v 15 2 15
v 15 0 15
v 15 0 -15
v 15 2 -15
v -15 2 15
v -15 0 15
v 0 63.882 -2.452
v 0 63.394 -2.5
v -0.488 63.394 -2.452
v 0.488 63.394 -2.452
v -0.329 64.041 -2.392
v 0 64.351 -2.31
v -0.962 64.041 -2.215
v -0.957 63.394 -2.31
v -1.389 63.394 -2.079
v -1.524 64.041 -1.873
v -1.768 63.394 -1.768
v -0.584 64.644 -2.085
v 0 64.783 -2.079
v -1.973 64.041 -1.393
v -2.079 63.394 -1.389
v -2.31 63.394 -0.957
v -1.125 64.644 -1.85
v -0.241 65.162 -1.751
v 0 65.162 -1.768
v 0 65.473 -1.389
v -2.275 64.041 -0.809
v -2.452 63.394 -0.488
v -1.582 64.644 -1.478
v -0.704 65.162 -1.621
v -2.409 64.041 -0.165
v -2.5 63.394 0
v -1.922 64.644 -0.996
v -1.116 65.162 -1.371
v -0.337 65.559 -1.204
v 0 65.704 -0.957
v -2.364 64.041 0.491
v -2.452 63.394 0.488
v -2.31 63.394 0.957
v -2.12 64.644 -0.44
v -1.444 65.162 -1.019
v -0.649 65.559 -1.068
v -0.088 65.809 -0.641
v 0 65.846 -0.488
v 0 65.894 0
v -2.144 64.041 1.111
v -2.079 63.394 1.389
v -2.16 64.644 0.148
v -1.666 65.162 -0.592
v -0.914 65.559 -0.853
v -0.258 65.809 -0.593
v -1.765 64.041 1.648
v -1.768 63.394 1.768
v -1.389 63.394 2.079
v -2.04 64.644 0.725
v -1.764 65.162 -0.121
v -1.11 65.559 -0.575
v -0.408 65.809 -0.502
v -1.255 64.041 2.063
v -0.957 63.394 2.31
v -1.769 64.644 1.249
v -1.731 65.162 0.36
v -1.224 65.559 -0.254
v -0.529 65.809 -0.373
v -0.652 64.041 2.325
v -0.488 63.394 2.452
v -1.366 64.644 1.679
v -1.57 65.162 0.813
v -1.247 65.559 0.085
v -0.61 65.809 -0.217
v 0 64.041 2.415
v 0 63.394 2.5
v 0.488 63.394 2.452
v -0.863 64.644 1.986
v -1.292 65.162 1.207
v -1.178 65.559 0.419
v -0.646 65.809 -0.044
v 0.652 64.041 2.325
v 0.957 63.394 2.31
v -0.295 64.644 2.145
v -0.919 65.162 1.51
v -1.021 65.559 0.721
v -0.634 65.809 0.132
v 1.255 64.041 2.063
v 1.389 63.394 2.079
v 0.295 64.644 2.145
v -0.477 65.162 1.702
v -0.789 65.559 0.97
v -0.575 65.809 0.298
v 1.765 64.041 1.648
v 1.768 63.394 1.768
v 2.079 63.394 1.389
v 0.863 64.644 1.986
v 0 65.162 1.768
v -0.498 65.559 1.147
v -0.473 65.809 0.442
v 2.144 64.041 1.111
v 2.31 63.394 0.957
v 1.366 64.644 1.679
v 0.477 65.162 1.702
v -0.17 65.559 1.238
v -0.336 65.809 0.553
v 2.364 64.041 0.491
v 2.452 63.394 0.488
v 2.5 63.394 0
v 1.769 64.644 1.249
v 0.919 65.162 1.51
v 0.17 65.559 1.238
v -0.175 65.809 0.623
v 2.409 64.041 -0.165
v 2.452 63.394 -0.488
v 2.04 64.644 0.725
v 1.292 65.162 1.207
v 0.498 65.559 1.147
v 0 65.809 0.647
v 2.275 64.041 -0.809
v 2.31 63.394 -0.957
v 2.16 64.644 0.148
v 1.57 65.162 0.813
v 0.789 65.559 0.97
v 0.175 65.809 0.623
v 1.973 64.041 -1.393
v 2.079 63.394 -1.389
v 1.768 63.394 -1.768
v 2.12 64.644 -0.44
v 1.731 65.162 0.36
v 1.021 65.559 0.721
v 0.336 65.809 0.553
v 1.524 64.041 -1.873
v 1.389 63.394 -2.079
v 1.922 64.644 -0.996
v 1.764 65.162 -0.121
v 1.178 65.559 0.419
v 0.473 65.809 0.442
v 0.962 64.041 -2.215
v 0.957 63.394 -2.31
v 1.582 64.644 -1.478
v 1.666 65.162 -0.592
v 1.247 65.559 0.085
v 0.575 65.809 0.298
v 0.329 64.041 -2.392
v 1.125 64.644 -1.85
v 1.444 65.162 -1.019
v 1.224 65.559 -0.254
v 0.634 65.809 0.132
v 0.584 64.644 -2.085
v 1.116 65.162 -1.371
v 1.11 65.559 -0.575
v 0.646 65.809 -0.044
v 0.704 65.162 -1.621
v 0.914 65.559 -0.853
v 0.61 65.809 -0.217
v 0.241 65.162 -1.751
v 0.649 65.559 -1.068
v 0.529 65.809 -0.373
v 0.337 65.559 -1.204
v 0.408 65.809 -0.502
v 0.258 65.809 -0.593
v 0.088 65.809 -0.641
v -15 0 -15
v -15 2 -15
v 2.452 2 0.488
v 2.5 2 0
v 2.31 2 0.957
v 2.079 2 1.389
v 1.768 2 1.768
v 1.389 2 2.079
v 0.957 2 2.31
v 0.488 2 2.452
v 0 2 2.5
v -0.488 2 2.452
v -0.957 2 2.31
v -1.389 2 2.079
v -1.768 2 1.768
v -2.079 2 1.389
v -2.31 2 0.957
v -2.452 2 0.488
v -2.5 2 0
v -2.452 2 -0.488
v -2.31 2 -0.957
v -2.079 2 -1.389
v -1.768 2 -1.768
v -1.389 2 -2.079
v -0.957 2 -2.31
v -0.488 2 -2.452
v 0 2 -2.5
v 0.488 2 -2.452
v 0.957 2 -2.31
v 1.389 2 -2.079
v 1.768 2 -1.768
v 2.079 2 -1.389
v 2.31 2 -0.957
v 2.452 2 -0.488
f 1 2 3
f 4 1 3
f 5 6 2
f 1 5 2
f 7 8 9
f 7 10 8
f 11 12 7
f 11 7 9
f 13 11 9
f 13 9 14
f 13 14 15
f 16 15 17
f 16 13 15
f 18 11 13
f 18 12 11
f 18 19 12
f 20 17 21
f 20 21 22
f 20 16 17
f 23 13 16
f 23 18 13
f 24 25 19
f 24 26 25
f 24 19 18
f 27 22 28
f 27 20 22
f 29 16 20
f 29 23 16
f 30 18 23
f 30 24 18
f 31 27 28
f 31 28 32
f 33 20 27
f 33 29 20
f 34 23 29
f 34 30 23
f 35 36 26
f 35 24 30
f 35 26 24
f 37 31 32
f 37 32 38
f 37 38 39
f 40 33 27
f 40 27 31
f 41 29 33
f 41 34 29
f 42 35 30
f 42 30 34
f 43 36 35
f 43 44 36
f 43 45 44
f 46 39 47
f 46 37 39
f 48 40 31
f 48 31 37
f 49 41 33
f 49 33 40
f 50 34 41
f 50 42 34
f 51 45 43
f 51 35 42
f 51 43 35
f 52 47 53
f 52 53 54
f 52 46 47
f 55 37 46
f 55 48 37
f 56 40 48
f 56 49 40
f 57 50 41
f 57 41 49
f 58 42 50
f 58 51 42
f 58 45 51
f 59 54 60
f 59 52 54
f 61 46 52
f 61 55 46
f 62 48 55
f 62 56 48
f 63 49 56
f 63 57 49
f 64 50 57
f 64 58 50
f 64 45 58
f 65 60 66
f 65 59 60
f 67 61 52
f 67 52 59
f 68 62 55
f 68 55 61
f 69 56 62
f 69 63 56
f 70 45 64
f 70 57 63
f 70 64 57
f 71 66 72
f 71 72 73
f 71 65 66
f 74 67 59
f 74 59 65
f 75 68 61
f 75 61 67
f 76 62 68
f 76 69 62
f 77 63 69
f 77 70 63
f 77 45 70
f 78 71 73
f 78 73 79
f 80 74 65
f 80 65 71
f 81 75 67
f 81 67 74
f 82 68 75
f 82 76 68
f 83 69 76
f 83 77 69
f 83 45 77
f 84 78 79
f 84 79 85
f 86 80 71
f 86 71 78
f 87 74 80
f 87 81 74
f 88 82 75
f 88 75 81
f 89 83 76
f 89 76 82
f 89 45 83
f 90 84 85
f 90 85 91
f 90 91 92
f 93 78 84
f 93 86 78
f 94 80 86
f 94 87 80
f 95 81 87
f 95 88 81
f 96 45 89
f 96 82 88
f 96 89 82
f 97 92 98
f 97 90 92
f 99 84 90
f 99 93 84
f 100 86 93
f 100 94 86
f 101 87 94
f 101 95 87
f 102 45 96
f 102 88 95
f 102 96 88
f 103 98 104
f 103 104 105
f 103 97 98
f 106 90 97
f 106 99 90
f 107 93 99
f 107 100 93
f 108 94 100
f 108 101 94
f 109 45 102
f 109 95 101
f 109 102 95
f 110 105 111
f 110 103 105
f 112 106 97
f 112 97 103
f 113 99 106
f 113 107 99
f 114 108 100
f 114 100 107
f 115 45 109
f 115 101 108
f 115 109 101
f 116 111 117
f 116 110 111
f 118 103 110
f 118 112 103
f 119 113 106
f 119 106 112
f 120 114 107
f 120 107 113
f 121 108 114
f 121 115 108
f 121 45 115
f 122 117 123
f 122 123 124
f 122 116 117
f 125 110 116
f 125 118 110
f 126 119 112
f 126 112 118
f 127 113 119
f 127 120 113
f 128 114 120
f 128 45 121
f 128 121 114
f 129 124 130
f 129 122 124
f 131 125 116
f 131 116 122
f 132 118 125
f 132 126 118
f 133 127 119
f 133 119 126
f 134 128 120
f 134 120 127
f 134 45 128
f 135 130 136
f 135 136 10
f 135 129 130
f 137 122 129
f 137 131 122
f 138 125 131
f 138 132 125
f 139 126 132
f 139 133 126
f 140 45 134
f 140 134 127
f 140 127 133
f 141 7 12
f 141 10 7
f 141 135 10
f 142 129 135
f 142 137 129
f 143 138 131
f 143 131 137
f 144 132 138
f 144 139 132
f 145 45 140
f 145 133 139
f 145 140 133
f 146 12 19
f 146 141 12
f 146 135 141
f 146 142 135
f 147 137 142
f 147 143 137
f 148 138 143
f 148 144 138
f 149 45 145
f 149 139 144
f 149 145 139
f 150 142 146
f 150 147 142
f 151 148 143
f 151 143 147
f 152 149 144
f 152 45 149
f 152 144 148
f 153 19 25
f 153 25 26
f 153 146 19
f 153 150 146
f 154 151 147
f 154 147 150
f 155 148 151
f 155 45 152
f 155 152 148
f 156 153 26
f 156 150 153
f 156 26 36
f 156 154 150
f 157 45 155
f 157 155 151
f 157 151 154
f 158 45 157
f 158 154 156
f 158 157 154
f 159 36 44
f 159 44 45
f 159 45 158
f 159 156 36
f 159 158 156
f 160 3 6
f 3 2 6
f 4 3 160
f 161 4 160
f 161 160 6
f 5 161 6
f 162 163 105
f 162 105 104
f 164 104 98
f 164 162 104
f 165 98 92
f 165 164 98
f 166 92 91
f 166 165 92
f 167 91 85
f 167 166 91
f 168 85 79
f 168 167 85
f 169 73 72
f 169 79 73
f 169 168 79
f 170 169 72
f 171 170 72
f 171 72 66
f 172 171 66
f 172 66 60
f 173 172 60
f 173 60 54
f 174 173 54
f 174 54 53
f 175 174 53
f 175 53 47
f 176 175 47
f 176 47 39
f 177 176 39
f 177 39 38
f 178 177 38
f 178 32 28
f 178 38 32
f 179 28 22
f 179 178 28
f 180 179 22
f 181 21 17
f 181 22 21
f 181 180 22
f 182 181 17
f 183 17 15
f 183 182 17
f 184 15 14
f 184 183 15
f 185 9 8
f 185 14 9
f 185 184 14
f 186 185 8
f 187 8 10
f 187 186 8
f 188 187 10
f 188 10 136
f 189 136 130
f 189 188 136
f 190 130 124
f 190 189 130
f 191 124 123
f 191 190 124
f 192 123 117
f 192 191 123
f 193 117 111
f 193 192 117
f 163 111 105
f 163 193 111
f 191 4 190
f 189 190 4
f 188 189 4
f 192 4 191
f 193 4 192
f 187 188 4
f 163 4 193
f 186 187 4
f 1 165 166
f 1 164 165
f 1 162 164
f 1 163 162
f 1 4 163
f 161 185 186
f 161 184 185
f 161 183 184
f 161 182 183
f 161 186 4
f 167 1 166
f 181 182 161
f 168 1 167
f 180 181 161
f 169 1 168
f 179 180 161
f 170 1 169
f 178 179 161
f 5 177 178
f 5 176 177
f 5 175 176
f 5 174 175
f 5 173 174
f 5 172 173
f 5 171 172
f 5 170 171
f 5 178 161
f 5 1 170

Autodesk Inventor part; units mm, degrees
ref_plane "YZ Plane" through (0, 0, 0) normal (1, 0, 0) x (0, 1, 0)
ref_plane "XZ Plane" through (0, 0, 0) normal (0, 1, 0) x (-1, 0, 0)
ref_plane "XY Plane" through (0, 0, 0) normal (0, 0, 1) x (1, 0, 0)
sketch "Sketch1" plane through (0, 0, 0) normal (0, 1, 0) x (-1, 0, 0)
  line L0 (15, 15) -> (-15, 15)
  line L1 (-15, 15) -> (-15, -15)
  line L2 (-15, -15) -> (15, -15)
  line L3 (15, -15) -> (15, 15)
  point P0 (0, 0)
  point P1 (15, 0)
  point P2 (0, 15)
  dimension "d0" = 30
  dimension "d1" = 30
  dimension "d2" = 0
  dimension "d3" = 0
extrude "Extrusion1" add sketch "Sketch1" along normal blind 2
sketch "Sketch2" plane through (0, 2, 0) normal (0, 1, 0) x (1, 0, 0)
  circle A0 centre (0, 0) radius 2.5
  dimension "d6" = 5
extrude "Extrusion2" add sketch "Sketch2" along normal blind 61.394
sketch "Sketch3" plane through (0, 63.394, 0) normal (0, 1, 0) x (1, 0, 0)
  point P0 (0, 0)
sketch "Sketch4" plane through (0, 0, 0) normal (1, 0, 0) x (0, 1, 0)
  line L0 (63.394, -2.5) -> (63.394, 2.5) projected
  circle A0 centre (63.394, 0) radius 2.5
  line L1 (65.894, 0) -> (63.394, 0)
  line L2 (63.394, 0) -> (63.394, -2.5)
  line L3 (65.894, 0) -> (66.7994, 0)
  point P0 (0, 0)
  dimension "d6" = 5
  dimension "d9" = 5
revolve "Revolution3" add sketch "Sketch4" angle 360 about axis through (0, 65.894, 0) along (0, -1, 0) picked at (64.2751, -1.4023) contours L0 L1 A0
properties part number "Pivot"
